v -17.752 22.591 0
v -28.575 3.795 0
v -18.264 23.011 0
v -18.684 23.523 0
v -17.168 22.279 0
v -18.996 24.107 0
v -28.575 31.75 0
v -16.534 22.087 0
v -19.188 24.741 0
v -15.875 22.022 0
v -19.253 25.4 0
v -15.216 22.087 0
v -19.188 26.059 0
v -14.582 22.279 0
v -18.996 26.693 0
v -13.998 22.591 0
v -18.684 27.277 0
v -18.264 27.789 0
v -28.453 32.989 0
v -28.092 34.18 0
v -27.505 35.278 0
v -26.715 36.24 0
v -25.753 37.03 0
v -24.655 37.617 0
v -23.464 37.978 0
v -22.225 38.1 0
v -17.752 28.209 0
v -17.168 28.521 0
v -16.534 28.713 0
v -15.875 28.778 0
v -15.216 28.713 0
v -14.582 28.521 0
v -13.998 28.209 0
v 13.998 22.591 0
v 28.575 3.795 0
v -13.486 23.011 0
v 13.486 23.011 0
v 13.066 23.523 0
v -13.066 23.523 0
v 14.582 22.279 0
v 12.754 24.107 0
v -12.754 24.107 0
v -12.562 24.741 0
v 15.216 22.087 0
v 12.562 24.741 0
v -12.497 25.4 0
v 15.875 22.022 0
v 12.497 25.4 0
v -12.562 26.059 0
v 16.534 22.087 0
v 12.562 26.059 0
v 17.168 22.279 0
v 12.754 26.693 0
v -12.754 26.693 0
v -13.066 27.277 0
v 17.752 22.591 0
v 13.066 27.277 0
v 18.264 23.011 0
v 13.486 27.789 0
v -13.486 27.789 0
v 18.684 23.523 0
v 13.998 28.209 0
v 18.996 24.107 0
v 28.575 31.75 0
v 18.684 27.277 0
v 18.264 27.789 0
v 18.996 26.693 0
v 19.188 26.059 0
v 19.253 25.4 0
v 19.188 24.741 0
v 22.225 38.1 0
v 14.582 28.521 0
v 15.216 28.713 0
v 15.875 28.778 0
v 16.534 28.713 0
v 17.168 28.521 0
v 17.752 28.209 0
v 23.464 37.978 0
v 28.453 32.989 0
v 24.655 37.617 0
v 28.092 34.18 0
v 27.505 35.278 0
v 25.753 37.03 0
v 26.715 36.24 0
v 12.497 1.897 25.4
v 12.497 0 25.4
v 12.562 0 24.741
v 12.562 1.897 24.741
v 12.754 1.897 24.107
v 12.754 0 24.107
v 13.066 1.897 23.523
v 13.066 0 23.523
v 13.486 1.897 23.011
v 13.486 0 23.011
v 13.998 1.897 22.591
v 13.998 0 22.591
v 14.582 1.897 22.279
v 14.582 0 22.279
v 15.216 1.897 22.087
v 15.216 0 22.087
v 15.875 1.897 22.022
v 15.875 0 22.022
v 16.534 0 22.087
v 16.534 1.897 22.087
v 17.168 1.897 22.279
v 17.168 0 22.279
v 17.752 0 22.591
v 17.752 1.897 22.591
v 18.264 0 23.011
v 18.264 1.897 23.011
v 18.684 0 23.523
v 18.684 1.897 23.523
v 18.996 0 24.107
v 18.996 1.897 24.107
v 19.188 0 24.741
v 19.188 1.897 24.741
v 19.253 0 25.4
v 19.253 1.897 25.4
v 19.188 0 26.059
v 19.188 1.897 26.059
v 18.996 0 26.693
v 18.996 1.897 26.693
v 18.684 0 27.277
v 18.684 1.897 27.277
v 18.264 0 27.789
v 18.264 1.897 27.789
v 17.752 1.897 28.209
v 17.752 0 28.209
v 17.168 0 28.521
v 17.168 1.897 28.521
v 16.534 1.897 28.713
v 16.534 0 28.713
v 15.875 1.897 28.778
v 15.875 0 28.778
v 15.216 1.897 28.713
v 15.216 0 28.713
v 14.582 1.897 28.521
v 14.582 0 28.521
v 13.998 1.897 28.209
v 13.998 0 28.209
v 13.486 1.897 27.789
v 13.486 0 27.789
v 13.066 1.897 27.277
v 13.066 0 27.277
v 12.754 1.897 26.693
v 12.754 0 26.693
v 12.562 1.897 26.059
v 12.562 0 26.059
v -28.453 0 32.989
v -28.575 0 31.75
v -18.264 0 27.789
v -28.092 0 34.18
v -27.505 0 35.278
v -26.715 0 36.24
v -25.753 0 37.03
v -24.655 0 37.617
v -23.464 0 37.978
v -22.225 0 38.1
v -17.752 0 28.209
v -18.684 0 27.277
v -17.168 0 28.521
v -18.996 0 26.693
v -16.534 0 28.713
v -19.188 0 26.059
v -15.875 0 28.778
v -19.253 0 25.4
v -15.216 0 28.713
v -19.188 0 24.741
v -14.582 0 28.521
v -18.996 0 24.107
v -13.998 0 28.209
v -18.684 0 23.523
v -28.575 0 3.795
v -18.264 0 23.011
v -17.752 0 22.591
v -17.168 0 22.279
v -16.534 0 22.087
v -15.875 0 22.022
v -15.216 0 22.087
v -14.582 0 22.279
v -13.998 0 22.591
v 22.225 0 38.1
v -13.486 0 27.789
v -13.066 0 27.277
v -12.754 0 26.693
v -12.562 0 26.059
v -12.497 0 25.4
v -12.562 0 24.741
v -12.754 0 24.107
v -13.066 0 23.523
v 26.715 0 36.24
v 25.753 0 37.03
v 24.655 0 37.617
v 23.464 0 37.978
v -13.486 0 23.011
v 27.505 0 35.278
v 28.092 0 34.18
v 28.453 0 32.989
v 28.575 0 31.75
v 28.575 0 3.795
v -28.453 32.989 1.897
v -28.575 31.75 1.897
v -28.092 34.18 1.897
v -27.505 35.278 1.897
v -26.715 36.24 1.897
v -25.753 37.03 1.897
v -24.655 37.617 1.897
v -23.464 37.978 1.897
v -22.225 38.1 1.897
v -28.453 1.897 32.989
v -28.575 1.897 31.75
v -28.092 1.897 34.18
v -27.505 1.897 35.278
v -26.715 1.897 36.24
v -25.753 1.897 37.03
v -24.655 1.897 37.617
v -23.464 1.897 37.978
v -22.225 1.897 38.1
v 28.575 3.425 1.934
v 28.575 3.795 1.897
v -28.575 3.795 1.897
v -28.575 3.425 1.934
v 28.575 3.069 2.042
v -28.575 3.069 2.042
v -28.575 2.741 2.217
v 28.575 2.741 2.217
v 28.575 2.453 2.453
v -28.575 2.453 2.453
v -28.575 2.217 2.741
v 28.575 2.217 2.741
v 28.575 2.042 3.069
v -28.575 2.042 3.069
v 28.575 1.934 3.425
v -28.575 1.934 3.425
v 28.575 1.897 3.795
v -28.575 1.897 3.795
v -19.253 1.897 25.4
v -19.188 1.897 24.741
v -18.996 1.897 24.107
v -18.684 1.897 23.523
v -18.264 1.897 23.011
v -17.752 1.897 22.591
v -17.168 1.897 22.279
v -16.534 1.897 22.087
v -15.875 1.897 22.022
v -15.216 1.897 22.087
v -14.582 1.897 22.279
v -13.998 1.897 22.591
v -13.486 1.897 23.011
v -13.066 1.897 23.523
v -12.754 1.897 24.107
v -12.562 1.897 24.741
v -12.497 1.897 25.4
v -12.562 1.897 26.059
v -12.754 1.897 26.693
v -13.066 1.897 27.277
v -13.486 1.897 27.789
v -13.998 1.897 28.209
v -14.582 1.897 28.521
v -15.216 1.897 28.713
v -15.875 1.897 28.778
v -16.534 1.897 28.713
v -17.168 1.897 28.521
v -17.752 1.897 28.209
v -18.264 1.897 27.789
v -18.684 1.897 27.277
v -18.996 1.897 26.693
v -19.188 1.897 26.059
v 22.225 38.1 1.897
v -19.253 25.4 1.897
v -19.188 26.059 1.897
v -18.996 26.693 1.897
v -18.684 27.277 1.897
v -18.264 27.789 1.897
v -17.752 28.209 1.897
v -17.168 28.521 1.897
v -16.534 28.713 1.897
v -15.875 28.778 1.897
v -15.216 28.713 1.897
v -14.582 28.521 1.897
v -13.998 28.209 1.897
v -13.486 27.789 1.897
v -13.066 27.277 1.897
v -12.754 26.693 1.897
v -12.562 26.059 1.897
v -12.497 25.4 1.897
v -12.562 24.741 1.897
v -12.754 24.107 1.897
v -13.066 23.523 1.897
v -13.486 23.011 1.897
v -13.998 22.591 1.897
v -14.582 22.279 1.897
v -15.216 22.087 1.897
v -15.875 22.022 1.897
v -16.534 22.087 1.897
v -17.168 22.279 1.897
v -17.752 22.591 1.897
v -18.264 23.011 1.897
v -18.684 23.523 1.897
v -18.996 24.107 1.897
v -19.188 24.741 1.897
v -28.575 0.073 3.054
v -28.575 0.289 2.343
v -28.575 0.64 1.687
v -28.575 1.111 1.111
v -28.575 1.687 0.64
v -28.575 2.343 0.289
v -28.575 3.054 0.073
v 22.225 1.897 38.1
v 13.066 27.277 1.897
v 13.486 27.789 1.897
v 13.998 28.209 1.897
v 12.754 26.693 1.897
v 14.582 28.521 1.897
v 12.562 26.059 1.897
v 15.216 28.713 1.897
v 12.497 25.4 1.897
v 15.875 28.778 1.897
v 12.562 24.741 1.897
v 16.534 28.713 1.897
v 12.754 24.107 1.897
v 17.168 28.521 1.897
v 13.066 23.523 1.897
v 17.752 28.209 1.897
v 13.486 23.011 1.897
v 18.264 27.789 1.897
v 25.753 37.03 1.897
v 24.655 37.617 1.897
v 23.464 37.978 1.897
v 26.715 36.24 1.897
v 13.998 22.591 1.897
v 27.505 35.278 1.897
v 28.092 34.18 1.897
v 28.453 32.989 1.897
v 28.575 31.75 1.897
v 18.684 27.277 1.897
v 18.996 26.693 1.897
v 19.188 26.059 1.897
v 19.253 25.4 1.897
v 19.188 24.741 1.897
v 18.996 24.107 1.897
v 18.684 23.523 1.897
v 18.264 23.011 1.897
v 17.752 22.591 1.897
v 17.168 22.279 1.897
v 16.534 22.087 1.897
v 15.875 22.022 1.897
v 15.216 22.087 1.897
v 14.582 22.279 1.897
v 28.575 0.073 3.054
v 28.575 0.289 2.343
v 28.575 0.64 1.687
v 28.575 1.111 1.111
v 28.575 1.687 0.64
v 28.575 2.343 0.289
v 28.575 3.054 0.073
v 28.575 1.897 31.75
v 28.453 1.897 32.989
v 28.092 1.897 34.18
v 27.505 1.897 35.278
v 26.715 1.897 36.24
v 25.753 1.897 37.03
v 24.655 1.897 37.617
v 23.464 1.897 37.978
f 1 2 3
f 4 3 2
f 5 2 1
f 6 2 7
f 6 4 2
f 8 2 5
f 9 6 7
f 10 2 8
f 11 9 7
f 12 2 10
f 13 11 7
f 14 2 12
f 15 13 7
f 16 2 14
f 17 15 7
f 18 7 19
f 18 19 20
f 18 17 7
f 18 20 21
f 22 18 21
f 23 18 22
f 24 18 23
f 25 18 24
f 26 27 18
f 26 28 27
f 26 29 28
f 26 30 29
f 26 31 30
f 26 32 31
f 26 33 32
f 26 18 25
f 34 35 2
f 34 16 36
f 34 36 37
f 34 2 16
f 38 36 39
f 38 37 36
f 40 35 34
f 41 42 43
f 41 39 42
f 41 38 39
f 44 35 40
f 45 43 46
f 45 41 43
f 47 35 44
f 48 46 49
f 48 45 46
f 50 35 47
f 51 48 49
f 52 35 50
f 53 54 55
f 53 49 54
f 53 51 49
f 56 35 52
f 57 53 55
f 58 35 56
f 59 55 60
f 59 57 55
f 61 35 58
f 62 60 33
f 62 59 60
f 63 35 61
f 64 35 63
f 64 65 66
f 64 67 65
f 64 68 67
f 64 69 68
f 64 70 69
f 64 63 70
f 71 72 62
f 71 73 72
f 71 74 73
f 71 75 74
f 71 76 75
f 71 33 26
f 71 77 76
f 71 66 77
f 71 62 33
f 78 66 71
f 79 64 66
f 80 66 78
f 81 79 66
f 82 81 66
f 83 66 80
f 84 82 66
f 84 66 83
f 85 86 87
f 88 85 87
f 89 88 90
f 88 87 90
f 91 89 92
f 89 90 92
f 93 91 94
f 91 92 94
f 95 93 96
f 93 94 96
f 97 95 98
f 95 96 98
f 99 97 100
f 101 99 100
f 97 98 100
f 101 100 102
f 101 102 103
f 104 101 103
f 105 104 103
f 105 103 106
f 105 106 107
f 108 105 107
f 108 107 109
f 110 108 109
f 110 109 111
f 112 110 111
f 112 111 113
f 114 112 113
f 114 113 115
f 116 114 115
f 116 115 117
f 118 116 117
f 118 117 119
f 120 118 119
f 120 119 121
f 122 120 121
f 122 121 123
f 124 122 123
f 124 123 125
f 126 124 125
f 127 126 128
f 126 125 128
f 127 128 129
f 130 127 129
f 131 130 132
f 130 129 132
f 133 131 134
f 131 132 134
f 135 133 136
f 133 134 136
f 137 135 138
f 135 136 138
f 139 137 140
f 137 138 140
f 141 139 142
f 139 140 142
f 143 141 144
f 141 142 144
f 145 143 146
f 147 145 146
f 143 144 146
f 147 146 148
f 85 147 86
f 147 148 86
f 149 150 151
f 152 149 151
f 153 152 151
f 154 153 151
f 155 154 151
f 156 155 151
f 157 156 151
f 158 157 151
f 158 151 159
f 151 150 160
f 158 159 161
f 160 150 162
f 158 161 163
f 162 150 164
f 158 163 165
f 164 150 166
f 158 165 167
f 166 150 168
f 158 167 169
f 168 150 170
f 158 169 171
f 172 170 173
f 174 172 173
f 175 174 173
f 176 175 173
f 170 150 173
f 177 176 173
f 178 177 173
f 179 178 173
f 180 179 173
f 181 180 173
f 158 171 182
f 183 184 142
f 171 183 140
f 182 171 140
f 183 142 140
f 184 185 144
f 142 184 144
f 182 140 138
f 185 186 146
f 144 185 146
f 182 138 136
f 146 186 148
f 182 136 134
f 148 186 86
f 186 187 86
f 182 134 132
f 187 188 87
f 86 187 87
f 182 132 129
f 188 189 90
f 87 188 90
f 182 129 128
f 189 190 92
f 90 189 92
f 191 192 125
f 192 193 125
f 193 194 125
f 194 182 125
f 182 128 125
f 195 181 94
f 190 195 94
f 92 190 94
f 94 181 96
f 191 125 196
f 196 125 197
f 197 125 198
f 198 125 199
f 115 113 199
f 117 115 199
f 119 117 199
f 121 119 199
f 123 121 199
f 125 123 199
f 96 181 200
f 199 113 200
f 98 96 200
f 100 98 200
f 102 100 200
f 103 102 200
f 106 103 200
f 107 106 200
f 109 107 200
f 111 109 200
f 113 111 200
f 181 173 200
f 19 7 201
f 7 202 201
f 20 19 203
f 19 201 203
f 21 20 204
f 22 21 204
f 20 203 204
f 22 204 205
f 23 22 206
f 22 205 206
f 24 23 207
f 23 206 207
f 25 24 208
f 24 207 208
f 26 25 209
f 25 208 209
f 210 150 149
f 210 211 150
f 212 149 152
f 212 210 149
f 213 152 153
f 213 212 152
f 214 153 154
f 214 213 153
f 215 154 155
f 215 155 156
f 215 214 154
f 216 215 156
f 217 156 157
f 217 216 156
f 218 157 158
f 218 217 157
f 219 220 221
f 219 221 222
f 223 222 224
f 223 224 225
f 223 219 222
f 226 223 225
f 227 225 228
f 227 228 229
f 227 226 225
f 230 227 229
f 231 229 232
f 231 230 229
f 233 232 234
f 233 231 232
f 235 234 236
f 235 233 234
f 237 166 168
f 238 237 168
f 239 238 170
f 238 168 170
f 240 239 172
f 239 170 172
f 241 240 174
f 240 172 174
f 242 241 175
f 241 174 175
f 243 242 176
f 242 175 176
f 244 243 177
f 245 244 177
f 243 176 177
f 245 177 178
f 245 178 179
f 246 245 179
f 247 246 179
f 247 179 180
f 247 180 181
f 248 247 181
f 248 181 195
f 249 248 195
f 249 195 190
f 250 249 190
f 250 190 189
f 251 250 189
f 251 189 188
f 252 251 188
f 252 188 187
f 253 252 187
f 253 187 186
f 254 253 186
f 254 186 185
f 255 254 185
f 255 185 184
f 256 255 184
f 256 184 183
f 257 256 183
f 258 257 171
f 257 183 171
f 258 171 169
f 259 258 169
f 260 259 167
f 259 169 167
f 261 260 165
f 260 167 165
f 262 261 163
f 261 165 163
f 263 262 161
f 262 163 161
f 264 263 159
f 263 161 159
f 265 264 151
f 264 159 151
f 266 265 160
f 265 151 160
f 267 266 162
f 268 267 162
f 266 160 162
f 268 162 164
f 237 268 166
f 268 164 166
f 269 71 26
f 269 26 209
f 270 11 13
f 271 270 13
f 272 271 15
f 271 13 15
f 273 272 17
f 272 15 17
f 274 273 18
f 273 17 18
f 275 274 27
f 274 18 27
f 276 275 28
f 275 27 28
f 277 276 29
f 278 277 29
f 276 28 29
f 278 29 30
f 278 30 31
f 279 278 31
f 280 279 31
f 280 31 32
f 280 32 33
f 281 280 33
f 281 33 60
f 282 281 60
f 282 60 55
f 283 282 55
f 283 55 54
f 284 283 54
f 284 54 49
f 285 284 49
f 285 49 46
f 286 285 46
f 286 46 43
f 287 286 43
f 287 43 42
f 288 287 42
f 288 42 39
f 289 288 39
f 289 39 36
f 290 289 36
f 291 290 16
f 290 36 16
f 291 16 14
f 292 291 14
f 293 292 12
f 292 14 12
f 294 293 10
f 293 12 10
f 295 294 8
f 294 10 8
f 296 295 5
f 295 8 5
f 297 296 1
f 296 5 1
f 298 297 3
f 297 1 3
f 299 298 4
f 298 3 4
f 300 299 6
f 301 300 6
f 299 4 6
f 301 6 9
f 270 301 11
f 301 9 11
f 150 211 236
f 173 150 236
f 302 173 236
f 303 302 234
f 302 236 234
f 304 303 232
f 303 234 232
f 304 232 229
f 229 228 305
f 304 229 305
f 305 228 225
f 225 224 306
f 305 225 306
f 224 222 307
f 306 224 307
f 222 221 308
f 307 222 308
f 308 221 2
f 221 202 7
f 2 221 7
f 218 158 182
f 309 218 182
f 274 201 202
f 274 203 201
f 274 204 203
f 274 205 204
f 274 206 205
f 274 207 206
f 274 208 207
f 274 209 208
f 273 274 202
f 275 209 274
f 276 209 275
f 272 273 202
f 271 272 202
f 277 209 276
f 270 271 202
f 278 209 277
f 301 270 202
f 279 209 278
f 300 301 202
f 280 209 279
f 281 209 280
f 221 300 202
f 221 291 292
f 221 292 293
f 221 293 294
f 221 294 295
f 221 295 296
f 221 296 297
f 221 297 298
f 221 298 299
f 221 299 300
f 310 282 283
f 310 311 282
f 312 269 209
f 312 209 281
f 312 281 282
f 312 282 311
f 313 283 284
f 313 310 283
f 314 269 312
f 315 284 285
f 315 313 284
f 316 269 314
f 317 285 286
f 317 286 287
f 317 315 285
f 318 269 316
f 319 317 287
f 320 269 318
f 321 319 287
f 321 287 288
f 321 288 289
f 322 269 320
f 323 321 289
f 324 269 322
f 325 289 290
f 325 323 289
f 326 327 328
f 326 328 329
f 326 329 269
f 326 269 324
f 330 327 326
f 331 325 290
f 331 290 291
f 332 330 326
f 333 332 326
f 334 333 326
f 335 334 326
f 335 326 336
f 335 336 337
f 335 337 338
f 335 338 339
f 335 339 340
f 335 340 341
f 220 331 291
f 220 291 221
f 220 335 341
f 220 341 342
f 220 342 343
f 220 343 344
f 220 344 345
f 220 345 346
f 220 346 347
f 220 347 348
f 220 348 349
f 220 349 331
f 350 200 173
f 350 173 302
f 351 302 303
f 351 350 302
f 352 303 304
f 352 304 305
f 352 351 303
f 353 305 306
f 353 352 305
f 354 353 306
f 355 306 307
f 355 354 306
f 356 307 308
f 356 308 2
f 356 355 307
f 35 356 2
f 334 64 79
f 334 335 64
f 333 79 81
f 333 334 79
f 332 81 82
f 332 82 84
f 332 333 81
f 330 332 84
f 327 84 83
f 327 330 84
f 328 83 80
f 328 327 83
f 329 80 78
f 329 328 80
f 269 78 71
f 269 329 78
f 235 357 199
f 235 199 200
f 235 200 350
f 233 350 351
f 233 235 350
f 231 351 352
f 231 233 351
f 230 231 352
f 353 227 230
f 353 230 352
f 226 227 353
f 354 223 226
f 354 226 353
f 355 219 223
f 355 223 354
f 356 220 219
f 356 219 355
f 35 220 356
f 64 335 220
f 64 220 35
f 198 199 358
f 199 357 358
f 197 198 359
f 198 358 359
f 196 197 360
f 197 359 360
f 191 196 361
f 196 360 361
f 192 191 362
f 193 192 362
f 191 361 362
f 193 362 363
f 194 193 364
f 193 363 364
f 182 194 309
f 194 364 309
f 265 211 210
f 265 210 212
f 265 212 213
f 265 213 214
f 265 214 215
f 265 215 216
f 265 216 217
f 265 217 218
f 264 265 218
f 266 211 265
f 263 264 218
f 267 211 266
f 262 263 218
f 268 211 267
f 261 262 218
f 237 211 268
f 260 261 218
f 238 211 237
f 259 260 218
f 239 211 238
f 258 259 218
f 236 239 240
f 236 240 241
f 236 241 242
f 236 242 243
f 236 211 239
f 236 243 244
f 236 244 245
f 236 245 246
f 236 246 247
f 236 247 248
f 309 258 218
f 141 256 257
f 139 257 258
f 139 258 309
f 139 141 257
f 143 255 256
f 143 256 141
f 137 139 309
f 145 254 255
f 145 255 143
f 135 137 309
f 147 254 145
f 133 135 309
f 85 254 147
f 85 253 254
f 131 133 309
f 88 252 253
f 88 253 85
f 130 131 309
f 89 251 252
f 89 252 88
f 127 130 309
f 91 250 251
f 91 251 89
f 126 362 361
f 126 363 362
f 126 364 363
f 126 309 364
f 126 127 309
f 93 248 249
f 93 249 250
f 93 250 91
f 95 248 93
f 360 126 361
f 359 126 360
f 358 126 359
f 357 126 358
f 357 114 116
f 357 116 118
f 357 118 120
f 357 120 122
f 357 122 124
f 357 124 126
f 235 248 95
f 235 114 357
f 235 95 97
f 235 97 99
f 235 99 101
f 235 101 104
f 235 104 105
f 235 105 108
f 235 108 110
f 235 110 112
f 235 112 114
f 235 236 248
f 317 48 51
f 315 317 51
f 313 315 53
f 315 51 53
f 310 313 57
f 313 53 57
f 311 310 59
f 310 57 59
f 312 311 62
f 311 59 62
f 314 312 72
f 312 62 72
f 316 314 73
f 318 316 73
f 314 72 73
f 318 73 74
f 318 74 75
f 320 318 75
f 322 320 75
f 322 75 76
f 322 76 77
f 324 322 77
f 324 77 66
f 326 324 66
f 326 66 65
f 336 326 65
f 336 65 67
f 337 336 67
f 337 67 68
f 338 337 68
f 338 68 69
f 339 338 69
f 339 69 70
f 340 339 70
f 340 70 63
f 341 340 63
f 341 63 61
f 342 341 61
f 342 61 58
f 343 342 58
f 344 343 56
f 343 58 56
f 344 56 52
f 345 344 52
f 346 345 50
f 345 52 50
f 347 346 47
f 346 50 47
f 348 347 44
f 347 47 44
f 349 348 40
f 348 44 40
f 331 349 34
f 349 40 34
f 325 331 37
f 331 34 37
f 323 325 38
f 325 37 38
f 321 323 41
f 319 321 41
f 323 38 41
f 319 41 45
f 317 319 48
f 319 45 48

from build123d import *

# Parameters (mm, degrees)
SKETCH1_W                    = 57.15
SKETCH1_H                    = 38.1
BASE_FLANGE1_DEPTH           = 1.89738
EDGE_FLANGE1_STRIP_W         = 11.38428
EDGE_FLANGE1_STRIP_H         = 1.89738
EDGE_FLANGE1_STRIP_CUT_DEPTH = 57.15
EDGE_FLANGE1_DEPTH           = 57.15
F_1_4_CLEARANCE_HOLE1_D      = 6.7564
F_1_4_CLEARANCE_HOLE2_D      = 6.7564
FILLET1_R                    = 6.35


# Sheet-metal steps are written as plain solids
with BuildPart() as part:
    # Sketch1 → Base-Flange1 (new body)
    with BuildSketch(Plane(origin=(0, 0, 0), x_dir=(1, 0, 0), z_dir=(0, 1, 0))):
        with Locations((0, -19.05)):
            Rectangle(SKETCH1_W, SKETCH1_H)
    extrude(amount=BASE_FLANGE1_DEPTH)

    # Edge-Flange1 strip (across the edge) → Edge-Flange1 strip cut (cut)
    with BuildSketch(Plane(origin=(28.575, 1.89738, 0), x_dir=(0, 0, 1), z_dir=(-1, 0, 0))):
        with Locations((-1.89738, -0.94869)):
            Rectangle(EDGE_FLANGE1_STRIP_W, EDGE_FLANGE1_STRIP_H)
    extrude(amount=EDGE_FLANGE1_STRIP_CUT_DEPTH, mode=Mode.SUBTRACT)

    # Edge-Flange1 section (across the edge) → Edge-Flange1 (add)
    with BuildSketch(Plane(origin=(28.575, 1.89738, 0), x_dir=(0, 0, 1), z_dir=(-1, 0, 0))):
        with BuildLine():
            Line((0, 1.89738), (0, 36.20262))
            Line((0, 36.20262), (1.89738, 36.20262))
            Line((1.89738, 36.20262), (1.89738, 1.89738))
            ThreePointArc((1.89738, 1.89738), (2.453109736, 0.555729736), (3.79476, 0))
            Line((3.79476, 0), (3.79476, -1.89738))
            ThreePointArc((3.79476, -1.89738), (1.111459471, -0.785920529), (0, 1.89738))
        make_face()
    extrude(amount=EDGE_FLANGE1_DEPTH)

    # 1/4 Clearance Hole1 (through all)
    with Locations(Plane(origin=(0, 1.89738, 0), x_dir=(1, 0, 0), z_dir=(0, 1, 0))):
        with Locations((-15.875, -25.4), (15.875, -25.4)):
            Hole(F_1_4_CLEARANCE_HOLE1_D / 2)

    # 1/4 Clearance Hole2 (through all)
    with Locations(Plane.XY.offset(1.89738)):
        with Locations((-15.875, 25.4), (15.875, 25.4)):
            Hole(F_1_4_CLEARANCE_HOLE2_D / 2)

    # Fillet1
    fillet1_edges = [part.edges().sort_by_distance(p)[0] for p in [
        (28.575, 38.1, 0.94869),
        (-28.575, 38.1, 0.94869),
        (28.575, 0.94869, 38.1),
        (-28.575, 0.94869, 38.1),
    ]]
    fillet(fillet1_edges, radius=FILLET1_R)


solid = part.part
